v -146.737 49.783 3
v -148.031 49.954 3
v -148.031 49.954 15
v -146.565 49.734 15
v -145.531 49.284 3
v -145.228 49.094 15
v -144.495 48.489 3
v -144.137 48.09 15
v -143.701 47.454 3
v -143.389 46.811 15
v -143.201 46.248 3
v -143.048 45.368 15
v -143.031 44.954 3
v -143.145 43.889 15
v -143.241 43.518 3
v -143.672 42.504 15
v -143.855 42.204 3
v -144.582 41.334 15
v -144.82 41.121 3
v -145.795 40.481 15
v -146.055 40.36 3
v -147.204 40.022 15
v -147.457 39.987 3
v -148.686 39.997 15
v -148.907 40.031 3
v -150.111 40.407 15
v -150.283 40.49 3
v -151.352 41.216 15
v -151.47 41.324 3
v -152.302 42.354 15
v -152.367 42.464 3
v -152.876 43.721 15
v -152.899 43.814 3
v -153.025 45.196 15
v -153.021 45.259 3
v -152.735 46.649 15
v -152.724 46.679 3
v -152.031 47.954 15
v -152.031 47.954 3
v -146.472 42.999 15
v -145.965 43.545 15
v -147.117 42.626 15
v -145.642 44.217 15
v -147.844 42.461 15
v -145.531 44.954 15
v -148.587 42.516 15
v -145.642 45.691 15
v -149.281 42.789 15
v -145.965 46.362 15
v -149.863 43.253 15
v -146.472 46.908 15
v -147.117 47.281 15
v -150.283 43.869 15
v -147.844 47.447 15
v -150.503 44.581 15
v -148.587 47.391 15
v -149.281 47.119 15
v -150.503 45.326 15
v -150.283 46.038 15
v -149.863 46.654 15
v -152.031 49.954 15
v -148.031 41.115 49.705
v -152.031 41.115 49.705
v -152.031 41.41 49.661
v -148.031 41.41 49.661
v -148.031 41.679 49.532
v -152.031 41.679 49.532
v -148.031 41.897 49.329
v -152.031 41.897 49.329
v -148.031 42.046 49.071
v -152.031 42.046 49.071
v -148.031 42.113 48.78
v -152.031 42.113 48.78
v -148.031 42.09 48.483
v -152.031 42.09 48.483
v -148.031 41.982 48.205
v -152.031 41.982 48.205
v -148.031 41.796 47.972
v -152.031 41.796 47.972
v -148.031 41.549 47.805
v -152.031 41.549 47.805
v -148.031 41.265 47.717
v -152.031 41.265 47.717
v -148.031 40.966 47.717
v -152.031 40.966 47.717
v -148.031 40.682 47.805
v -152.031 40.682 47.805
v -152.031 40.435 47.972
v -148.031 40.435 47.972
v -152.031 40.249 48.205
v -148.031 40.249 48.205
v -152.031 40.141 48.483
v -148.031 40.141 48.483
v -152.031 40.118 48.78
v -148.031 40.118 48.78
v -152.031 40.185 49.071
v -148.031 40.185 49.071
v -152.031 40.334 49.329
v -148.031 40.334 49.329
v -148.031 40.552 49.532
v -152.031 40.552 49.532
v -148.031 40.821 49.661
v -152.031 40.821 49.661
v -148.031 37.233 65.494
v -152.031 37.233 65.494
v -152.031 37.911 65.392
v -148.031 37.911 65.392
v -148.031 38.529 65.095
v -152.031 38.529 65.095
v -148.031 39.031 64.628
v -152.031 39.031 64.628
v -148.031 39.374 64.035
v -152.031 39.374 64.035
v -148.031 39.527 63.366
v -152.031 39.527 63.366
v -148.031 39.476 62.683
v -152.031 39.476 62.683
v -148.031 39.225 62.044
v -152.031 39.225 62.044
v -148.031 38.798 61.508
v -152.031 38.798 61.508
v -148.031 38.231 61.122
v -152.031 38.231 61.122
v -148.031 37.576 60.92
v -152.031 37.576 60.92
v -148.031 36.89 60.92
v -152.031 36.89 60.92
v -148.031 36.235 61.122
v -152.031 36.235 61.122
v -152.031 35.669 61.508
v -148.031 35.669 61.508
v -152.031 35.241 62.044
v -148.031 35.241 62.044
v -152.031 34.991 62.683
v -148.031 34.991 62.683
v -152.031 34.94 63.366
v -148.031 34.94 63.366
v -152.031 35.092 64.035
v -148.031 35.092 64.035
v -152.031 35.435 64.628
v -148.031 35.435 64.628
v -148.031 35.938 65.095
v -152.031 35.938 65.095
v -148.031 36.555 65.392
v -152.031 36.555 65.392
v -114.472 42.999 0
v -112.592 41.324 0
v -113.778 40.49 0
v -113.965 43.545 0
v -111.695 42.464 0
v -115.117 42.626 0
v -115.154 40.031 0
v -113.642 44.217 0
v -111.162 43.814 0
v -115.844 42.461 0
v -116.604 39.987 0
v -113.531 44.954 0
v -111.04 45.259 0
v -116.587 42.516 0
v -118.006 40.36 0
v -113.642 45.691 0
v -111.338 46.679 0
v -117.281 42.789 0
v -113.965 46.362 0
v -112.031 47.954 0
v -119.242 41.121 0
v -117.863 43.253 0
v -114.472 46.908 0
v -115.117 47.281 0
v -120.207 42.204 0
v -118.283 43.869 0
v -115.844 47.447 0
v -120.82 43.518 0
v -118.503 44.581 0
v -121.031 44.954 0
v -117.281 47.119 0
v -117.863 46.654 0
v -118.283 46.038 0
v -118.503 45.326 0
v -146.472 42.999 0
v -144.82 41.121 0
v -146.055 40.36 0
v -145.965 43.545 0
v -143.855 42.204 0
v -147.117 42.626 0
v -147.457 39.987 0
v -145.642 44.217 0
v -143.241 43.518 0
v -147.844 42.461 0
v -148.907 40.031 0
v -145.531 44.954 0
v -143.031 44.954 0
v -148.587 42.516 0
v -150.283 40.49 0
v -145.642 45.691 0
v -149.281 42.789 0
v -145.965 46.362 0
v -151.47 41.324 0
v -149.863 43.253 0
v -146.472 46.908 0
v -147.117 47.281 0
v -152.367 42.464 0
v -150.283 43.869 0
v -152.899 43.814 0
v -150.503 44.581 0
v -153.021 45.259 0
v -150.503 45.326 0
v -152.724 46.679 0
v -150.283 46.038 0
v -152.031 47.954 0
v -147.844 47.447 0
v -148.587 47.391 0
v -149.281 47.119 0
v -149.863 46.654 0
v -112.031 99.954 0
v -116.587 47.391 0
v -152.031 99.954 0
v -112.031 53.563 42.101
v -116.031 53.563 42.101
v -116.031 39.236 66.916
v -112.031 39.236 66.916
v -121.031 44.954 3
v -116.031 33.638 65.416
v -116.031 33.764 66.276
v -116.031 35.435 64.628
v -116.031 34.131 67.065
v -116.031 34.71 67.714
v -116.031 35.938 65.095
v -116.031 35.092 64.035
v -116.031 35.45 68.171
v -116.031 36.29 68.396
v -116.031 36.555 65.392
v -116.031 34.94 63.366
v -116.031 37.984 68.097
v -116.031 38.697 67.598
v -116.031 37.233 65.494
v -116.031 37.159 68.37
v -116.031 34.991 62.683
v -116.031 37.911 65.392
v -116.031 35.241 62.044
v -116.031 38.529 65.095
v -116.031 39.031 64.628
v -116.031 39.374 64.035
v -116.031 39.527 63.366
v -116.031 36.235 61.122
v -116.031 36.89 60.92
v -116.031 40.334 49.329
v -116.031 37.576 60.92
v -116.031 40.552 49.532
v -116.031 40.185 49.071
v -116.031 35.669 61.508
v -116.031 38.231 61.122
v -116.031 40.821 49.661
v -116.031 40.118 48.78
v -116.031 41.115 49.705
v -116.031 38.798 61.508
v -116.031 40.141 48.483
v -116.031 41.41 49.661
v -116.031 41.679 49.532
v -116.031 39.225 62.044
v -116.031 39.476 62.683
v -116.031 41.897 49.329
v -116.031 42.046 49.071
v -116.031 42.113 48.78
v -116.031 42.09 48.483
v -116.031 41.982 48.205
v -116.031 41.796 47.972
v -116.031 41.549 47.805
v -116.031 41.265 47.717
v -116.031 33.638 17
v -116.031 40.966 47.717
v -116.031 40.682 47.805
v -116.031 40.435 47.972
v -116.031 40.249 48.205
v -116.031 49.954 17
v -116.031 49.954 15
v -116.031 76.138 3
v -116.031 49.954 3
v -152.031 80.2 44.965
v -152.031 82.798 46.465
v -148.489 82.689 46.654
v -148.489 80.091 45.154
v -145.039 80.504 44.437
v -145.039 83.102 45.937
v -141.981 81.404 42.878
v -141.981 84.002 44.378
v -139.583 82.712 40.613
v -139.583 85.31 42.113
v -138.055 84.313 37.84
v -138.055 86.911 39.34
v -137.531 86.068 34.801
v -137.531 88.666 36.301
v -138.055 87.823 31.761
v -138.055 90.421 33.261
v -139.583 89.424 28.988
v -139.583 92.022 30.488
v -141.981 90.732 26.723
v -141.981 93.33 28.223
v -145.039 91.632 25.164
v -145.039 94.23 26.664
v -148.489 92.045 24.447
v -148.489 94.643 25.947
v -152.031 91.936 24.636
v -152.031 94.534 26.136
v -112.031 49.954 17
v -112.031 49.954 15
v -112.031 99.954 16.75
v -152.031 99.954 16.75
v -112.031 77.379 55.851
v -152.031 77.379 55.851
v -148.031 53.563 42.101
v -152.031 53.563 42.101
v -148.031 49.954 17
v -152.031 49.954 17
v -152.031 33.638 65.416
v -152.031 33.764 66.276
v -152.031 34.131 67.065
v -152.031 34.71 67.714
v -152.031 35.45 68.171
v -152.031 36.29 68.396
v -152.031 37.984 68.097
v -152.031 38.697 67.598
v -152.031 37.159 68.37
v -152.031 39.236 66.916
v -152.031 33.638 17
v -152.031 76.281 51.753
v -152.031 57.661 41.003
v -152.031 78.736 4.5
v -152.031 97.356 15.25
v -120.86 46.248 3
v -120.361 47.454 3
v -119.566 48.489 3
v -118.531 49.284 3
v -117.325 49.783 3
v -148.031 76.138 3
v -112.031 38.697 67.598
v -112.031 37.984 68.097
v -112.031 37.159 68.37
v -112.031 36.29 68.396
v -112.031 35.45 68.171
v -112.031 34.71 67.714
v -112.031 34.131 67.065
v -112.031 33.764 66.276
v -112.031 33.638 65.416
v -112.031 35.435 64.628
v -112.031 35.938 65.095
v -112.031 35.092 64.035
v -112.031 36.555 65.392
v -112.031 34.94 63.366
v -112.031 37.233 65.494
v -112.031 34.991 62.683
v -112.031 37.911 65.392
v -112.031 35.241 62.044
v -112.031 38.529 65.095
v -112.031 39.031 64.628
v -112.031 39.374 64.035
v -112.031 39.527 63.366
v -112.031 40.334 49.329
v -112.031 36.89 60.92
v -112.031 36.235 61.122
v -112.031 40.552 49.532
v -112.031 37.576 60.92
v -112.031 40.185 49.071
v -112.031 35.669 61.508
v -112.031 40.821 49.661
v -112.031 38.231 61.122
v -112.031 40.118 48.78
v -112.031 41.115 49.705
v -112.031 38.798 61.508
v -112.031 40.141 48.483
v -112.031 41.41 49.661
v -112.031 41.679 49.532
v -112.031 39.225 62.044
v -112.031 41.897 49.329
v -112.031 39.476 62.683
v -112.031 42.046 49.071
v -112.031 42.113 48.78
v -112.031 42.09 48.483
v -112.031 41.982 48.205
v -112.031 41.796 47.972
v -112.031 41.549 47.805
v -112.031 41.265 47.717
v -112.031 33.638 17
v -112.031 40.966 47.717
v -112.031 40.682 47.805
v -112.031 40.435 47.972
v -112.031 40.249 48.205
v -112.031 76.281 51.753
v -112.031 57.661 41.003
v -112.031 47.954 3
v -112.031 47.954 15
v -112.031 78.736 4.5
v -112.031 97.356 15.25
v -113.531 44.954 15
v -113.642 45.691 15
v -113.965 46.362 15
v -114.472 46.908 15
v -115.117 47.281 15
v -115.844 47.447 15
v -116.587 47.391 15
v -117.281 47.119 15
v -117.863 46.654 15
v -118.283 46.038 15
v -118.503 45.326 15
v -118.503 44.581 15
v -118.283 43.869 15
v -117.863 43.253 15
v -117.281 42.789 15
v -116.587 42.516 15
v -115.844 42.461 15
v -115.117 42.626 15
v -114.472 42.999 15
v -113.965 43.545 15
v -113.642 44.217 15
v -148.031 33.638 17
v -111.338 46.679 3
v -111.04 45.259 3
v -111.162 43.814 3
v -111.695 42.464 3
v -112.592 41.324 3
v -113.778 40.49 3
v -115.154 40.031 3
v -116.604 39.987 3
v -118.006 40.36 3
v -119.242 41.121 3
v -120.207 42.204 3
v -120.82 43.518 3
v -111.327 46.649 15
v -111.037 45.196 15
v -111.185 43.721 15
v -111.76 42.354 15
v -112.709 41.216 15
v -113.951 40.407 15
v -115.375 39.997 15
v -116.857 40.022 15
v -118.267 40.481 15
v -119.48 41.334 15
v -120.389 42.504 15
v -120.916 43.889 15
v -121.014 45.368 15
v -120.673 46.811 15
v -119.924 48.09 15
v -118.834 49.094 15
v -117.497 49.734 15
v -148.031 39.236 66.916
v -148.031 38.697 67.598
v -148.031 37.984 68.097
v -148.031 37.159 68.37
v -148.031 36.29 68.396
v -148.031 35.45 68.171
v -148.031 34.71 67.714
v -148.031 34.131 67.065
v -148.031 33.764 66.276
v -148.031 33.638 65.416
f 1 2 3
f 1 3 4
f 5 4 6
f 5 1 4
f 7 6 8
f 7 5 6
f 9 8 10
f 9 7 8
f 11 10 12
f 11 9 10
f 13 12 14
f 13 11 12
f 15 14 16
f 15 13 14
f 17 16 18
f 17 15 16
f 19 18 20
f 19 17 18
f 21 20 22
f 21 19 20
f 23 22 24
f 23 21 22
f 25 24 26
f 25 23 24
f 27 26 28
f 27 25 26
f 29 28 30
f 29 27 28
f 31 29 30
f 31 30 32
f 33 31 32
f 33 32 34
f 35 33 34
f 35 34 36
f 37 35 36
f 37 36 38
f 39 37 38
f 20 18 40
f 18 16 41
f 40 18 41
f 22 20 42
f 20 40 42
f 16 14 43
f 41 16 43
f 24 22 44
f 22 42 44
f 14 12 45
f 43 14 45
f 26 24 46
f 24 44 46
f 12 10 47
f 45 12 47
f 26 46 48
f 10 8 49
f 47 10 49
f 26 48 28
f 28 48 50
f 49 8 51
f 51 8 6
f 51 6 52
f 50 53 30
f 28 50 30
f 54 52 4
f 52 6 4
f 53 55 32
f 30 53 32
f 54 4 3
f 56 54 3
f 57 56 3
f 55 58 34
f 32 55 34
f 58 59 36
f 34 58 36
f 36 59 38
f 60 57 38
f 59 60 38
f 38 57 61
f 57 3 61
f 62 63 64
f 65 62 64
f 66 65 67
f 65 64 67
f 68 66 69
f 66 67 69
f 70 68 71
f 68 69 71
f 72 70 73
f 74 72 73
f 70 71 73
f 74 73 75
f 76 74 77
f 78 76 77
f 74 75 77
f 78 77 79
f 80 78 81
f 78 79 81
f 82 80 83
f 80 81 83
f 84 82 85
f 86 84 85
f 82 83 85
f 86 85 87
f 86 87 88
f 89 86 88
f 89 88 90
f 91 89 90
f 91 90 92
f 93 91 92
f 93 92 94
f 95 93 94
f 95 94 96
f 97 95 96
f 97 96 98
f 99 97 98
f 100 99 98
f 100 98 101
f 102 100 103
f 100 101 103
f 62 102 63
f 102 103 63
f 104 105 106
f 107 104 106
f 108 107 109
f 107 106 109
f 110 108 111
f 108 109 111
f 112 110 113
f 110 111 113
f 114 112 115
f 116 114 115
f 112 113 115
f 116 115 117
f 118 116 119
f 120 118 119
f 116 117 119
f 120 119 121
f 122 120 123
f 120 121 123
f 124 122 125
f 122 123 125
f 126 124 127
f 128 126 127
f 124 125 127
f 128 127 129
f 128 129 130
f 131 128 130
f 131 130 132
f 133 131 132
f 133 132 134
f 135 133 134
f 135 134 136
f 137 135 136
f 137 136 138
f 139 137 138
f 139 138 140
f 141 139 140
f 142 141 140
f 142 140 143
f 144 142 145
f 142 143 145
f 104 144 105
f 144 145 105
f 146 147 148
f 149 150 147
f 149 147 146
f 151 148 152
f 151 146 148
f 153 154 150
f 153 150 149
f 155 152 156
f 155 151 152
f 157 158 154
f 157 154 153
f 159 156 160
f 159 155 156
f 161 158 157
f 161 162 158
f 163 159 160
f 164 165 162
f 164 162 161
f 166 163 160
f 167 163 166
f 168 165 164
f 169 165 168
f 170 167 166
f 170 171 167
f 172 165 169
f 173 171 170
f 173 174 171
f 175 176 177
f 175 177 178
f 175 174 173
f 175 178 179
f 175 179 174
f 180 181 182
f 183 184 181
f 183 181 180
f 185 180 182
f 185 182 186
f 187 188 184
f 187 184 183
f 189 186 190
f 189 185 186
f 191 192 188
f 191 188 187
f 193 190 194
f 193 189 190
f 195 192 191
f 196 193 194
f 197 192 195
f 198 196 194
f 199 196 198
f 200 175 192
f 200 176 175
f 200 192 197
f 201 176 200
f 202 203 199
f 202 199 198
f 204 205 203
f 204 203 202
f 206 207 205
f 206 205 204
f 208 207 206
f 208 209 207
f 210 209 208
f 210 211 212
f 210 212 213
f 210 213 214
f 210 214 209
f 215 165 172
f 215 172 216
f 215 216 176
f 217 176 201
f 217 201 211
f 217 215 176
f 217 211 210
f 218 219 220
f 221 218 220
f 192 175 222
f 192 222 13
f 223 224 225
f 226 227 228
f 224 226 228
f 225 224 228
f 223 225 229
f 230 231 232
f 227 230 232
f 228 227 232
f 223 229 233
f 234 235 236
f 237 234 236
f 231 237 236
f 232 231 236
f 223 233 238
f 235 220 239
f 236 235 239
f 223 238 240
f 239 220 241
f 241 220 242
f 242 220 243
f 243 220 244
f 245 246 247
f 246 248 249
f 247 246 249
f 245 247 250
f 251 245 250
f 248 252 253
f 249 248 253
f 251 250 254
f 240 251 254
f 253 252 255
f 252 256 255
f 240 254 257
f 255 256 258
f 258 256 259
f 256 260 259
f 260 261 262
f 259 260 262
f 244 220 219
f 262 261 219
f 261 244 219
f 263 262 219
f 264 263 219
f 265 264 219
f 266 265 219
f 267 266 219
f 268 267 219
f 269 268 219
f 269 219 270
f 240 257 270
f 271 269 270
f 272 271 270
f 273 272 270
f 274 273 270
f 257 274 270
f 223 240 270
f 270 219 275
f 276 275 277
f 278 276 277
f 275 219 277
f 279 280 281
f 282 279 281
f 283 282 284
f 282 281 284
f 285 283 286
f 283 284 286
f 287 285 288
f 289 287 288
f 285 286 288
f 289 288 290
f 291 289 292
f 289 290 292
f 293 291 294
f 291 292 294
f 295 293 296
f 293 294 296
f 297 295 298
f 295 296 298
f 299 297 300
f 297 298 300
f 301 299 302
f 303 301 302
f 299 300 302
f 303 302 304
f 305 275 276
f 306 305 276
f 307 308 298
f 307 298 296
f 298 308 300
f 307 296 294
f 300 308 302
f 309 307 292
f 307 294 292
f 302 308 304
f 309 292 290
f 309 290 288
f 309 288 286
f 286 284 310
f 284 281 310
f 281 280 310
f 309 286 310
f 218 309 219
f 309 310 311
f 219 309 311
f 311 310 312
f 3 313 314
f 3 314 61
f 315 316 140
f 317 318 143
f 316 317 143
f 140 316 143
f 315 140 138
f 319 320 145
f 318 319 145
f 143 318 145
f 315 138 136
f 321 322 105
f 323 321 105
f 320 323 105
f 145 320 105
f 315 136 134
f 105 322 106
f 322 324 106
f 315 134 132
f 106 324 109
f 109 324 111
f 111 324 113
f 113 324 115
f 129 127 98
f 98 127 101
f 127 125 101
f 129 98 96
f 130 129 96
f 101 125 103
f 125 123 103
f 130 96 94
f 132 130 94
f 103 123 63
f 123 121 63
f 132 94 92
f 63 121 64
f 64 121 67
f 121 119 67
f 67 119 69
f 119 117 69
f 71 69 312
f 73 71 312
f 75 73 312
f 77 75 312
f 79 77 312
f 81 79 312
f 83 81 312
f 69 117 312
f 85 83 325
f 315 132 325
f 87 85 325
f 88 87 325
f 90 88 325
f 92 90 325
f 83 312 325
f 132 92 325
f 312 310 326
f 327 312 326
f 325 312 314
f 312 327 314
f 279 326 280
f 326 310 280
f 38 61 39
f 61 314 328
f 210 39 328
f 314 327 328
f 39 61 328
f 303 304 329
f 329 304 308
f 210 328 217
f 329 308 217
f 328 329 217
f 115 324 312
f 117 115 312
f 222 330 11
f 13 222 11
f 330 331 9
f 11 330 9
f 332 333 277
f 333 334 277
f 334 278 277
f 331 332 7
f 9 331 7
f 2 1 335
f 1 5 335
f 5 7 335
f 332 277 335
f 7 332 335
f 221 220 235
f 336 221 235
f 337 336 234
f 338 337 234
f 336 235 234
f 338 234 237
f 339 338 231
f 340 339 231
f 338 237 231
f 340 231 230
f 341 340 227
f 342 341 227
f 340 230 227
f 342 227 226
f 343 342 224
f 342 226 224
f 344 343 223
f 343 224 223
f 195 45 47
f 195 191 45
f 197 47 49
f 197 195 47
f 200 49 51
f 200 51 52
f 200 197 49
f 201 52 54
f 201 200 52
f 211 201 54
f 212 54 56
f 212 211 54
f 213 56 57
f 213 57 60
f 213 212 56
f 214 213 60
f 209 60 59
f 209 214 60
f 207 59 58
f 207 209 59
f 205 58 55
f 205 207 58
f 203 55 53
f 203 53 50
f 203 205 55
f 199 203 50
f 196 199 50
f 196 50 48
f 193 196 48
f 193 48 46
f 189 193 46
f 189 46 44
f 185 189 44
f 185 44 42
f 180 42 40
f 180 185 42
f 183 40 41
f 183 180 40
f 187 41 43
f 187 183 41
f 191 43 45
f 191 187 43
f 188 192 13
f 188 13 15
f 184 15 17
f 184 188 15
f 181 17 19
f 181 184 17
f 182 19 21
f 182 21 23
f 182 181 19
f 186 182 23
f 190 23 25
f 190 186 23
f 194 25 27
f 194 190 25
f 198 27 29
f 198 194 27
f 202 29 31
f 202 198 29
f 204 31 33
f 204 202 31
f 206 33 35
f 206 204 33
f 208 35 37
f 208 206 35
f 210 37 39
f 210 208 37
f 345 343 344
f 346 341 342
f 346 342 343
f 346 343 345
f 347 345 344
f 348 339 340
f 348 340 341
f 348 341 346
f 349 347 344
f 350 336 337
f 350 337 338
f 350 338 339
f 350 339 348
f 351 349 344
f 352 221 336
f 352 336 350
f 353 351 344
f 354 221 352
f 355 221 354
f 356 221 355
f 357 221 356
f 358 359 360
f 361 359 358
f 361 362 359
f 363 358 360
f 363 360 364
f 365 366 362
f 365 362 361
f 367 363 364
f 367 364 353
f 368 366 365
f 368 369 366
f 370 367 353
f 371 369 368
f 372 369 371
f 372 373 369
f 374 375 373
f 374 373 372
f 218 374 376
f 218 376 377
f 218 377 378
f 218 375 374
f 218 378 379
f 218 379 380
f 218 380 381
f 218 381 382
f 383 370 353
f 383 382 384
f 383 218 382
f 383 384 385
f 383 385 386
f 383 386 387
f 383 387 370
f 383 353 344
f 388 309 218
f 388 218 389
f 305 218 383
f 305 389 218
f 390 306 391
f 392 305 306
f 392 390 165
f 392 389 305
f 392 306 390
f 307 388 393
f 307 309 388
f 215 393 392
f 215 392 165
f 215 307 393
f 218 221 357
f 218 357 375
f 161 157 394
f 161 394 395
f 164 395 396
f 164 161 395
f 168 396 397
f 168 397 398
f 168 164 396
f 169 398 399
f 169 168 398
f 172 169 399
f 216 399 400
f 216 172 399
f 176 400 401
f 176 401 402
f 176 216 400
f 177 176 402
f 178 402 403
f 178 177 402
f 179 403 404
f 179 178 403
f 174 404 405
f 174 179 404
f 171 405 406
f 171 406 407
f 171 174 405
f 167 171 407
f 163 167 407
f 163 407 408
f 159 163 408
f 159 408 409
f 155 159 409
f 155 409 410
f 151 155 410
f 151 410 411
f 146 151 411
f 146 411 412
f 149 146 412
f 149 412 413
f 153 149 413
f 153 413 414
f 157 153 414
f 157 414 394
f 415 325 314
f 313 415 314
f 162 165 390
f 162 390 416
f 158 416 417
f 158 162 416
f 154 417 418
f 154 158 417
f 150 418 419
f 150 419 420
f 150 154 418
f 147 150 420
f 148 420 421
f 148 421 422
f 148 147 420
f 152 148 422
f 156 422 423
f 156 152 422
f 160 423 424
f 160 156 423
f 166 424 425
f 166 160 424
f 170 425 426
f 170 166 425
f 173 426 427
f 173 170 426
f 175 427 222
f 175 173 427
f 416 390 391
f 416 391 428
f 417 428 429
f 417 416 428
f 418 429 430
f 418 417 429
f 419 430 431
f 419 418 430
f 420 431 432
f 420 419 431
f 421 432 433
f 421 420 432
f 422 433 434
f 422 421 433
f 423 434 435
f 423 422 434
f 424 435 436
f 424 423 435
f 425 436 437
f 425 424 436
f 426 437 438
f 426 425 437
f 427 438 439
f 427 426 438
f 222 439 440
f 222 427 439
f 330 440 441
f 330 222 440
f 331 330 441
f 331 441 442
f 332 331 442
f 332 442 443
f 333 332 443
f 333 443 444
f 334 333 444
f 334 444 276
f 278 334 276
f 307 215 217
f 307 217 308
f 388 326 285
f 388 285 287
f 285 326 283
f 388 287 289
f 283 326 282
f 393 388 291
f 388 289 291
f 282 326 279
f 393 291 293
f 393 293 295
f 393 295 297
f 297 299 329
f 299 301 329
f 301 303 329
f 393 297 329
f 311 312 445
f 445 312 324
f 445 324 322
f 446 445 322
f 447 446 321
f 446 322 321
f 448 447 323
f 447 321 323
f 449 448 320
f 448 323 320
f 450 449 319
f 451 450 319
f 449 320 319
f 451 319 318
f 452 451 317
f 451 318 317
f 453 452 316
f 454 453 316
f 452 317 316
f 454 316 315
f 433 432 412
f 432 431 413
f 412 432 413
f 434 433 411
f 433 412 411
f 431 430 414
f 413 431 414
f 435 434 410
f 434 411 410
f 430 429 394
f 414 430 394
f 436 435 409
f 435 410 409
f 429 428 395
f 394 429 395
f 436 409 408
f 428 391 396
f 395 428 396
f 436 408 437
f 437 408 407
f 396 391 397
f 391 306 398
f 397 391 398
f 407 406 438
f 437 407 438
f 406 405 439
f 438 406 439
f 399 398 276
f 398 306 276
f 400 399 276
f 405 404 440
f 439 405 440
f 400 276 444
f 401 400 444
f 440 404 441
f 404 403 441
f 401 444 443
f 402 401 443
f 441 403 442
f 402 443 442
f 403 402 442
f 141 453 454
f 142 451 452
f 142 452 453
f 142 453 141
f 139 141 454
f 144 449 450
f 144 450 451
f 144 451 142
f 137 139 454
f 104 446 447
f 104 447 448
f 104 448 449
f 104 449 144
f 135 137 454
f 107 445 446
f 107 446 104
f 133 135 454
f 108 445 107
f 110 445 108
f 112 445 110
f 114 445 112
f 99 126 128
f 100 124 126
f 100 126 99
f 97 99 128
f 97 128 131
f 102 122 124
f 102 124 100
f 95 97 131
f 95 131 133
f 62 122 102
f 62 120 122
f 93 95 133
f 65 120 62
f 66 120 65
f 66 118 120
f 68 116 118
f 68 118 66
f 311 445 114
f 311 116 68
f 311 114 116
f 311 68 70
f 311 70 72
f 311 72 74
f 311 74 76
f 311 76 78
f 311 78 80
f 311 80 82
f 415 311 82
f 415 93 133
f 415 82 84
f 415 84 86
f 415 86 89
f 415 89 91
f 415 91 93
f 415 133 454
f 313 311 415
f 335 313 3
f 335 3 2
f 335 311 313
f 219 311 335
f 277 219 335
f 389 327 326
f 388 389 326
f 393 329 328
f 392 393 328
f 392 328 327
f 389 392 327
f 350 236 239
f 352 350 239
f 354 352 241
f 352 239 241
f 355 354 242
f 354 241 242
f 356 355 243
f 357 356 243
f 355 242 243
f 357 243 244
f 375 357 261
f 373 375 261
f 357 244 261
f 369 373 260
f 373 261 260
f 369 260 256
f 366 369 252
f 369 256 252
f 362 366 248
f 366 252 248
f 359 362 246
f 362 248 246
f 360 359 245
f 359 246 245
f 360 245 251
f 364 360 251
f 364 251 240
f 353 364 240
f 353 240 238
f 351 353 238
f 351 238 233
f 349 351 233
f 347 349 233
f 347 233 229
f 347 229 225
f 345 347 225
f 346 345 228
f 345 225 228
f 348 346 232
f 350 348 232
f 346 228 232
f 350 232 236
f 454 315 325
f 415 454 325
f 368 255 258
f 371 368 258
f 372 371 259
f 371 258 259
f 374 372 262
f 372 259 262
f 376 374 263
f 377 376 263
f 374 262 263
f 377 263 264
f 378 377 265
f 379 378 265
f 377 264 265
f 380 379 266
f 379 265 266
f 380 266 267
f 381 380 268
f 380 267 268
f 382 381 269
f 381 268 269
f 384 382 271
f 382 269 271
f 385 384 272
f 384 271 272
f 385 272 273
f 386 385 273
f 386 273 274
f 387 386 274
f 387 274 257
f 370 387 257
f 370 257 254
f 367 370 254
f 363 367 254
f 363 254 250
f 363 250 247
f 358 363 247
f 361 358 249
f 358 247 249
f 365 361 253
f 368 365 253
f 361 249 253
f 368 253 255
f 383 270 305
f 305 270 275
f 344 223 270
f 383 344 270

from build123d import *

# Parameters (mm, degrees)
CROQUIS2_R              = 2.5
SALIENTE_EXTRUIR1_DEPTH = 3
SALIENTE_EXTRUIR2_DEPTH = 40
CROQUIS4_R              = 2.5
SALIENTE_EXTRUIR3_DEPTH = 12
CROQUIS6_R              = 2.3
CROQUIS6_R_2            = 1
SALIENTE_EXTRUIR5_DEPTH = 4.000002
SALIENTE_EXTRUIR6_START = -36.000002
CROQUIS6_2_R            = 2.3
CROQUIS6_2_R_2          = 1
SALIENTE_EXTRUIR6_DEPTH = 3.999998
CROQUIS7_R              = 12
CORTAR_EXTRUIR1_DEPTH   = 3


with BuildPart() as part:
    # Croquis2 → Saliente-Extruir1 (new body)
    with BuildSketch(Plane.XY):
        with BuildLine():
            Line((-152.030771759, 47.953613054), (-152.030771759, 99.953613054))
            Line((-152.030771759, 99.953613054), (-112.030771759, 99.953613054))
            Line((-112.030771759, 99.953613054), (-112.030771759, 47.953613054))
            ThreePointArc((-112.030771759, 47.953613054), (-114.449632929, 40.210196563), (-121.030771759, 44.953613054))
            Line((-121.030771759, 44.953613054), (-143.030771759, 44.953613054))
            ThreePointArc((-143.030771759, 44.953613054), (-149.611910589, 40.210196563), (-152.030771759, 47.953613054))
        make_face()
        with Locations((-148.030771759, 44.953613054)):
            Circle(CROQUIS2_R, mode=Mode.SUBTRACT)
        with Locations((-116.030771759, 44.953613054)):
            Circle(CROQUIS2_R, mode=Mode.SUBTRACT)
    extrude(amount=SALIENTE_EXTRUIR1_DEPTH)

    # Croquis3 → Saliente-Extruir2 (add)
    with BuildSketch(Plane.ZY.offset(152.030771759)):
        Polygon((3, 99.953613054), (16.75, 99.953613054), (55.851046981, 77.378613054), (42.101046981, 53.56291445), (3, 76.13791445), align=None)
        Polygon((15.25, 97.355536842), (4.5, 78.735990661), (41.00297077, 57.660990661), (51.75297077, 76.280536842), align=None, mode=Mode.SUBTRACT)
    extrude(amount=-SALIENTE_EXTRUIR2_DEPTH)

    # Croquis4 → Saliente-Extruir3 (add)
    # profile 1 of 2: a face of its own
    with BuildSketch(Plane.XY.offset(3)):
        with BuildLine():
            Line((-152.030771759, 47.953613054), (-152.030771759, 49.953613054))
            Line((-152.030771759, 49.953613054), (-148.030771759, 49.953613054))
            ThreePointArc((-148.030771759, 49.953613054), (-145.794703781, 40.481477099), (-152.030771759, 47.953613054))
        make_face()
        with Locations((-148.030771759, 44.953613054)):
            Circle(CROQUIS4_R, mode=Mode.SUBTRACT)
    # profile 2 of 2: a face of its own
    with BuildSketch(Plane.XY.offset(3)):
        with BuildLine():
            Line((-112.030771759, 49.953613054), (-112.030771759, 47.953613054))
            ThreePointArc((-112.030771759, 47.953613054), (-118.266839736, 40.481477099), (-116.030771759, 49.953613054))
            Line((-116.030771759, 49.953613054), (-112.030771759, 49.953613054))
        make_face()
        with Locations((-116.030771759, 44.953613054)):
            Circle(CROQUIS4_R, mode=Mode.SUBTRACT)
    extrude(amount=SALIENTE_EXTRUIR3_DEPTH)

    # Croquis6 → Saliente-Extruir5 (add)
    with BuildSketch(Plane.ZY.offset(152.030771759)):
        with BuildLine():
            Line((3, 49.953613054), (3, 76.13791445))
            Line((3, 76.13791445), (66.916006899, 39.235990661))
            ThreePointArc((66.916006899, 39.235990661), (68.313784378, 35.861457314), (65.416006899, 33.63791445))
            Line((65.416006899, 33.63791445), (17, 33.63791445))
            Line((17, 33.63791445), (17, 49.953613054))
            Line((17, 49.953613054), (3, 49.953613054))
        make_face()
        with Locations((63.194377499, 37.233198253)):
            Circle(CROQUIS6_R, mode=Mode.SUBTRACT)
        with Locations((48.705490104, 41.11548393)):
            Circle(CROQUIS6_R_2, mode=Mode.SUBTRACT)
    extrude(amount=-SALIENTE_EXTRUIR5_DEPTH)

    # Croquis6<2> → Saliente-Extruir6 (add)
    with BuildSketch(Plane.ZY.offset(152.030771759).offset(SALIENTE_EXTRUIR6_START)):
        with BuildLine():
            Line((3, 49.953613054), (3, 76.13791445))
            Line((3, 76.13791445), (66.916006899, 39.235990661))
            ThreePointArc((66.916006899, 39.235990661), (68.313784378, 35.861457314), (65.416006899, 33.63791445))
            Line((65.416006899, 33.63791445), (17, 33.63791445))
            Line((17, 33.63791445), (17, 49.953613054))
            Line((17, 49.953613054), (3, 49.953613054))
        make_face()
        with Locations((63.194377499, 37.233198253)):
            Circle(CROQUIS6_2_R, mode=Mode.SUBTRACT)
        with Locations((48.705490104, 41.11548393)):
            Circle(CROQUIS6_2_R_2, mode=Mode.SUBTRACT)
    extrude(amount=-SALIENTE_EXTRUIR6_DEPTH)

    # Croquis7 → Cortar-Extruir1 (cut)
    with BuildSketch(Plane(origin=(0, 82.218172547, 47.468684052), x_dir=(1, 0, 0), z_dir=(0, 0.8660254037844388, 0.49999999999999983))):
        with Locations((-149.530771759, 12.895881013)):
            Circle(CROQUIS7_R)
    extrude(amount=-CORTAR_EXTRUIR1_DEPTH, mode=Mode.SUBTRACT)


solid = part.part
